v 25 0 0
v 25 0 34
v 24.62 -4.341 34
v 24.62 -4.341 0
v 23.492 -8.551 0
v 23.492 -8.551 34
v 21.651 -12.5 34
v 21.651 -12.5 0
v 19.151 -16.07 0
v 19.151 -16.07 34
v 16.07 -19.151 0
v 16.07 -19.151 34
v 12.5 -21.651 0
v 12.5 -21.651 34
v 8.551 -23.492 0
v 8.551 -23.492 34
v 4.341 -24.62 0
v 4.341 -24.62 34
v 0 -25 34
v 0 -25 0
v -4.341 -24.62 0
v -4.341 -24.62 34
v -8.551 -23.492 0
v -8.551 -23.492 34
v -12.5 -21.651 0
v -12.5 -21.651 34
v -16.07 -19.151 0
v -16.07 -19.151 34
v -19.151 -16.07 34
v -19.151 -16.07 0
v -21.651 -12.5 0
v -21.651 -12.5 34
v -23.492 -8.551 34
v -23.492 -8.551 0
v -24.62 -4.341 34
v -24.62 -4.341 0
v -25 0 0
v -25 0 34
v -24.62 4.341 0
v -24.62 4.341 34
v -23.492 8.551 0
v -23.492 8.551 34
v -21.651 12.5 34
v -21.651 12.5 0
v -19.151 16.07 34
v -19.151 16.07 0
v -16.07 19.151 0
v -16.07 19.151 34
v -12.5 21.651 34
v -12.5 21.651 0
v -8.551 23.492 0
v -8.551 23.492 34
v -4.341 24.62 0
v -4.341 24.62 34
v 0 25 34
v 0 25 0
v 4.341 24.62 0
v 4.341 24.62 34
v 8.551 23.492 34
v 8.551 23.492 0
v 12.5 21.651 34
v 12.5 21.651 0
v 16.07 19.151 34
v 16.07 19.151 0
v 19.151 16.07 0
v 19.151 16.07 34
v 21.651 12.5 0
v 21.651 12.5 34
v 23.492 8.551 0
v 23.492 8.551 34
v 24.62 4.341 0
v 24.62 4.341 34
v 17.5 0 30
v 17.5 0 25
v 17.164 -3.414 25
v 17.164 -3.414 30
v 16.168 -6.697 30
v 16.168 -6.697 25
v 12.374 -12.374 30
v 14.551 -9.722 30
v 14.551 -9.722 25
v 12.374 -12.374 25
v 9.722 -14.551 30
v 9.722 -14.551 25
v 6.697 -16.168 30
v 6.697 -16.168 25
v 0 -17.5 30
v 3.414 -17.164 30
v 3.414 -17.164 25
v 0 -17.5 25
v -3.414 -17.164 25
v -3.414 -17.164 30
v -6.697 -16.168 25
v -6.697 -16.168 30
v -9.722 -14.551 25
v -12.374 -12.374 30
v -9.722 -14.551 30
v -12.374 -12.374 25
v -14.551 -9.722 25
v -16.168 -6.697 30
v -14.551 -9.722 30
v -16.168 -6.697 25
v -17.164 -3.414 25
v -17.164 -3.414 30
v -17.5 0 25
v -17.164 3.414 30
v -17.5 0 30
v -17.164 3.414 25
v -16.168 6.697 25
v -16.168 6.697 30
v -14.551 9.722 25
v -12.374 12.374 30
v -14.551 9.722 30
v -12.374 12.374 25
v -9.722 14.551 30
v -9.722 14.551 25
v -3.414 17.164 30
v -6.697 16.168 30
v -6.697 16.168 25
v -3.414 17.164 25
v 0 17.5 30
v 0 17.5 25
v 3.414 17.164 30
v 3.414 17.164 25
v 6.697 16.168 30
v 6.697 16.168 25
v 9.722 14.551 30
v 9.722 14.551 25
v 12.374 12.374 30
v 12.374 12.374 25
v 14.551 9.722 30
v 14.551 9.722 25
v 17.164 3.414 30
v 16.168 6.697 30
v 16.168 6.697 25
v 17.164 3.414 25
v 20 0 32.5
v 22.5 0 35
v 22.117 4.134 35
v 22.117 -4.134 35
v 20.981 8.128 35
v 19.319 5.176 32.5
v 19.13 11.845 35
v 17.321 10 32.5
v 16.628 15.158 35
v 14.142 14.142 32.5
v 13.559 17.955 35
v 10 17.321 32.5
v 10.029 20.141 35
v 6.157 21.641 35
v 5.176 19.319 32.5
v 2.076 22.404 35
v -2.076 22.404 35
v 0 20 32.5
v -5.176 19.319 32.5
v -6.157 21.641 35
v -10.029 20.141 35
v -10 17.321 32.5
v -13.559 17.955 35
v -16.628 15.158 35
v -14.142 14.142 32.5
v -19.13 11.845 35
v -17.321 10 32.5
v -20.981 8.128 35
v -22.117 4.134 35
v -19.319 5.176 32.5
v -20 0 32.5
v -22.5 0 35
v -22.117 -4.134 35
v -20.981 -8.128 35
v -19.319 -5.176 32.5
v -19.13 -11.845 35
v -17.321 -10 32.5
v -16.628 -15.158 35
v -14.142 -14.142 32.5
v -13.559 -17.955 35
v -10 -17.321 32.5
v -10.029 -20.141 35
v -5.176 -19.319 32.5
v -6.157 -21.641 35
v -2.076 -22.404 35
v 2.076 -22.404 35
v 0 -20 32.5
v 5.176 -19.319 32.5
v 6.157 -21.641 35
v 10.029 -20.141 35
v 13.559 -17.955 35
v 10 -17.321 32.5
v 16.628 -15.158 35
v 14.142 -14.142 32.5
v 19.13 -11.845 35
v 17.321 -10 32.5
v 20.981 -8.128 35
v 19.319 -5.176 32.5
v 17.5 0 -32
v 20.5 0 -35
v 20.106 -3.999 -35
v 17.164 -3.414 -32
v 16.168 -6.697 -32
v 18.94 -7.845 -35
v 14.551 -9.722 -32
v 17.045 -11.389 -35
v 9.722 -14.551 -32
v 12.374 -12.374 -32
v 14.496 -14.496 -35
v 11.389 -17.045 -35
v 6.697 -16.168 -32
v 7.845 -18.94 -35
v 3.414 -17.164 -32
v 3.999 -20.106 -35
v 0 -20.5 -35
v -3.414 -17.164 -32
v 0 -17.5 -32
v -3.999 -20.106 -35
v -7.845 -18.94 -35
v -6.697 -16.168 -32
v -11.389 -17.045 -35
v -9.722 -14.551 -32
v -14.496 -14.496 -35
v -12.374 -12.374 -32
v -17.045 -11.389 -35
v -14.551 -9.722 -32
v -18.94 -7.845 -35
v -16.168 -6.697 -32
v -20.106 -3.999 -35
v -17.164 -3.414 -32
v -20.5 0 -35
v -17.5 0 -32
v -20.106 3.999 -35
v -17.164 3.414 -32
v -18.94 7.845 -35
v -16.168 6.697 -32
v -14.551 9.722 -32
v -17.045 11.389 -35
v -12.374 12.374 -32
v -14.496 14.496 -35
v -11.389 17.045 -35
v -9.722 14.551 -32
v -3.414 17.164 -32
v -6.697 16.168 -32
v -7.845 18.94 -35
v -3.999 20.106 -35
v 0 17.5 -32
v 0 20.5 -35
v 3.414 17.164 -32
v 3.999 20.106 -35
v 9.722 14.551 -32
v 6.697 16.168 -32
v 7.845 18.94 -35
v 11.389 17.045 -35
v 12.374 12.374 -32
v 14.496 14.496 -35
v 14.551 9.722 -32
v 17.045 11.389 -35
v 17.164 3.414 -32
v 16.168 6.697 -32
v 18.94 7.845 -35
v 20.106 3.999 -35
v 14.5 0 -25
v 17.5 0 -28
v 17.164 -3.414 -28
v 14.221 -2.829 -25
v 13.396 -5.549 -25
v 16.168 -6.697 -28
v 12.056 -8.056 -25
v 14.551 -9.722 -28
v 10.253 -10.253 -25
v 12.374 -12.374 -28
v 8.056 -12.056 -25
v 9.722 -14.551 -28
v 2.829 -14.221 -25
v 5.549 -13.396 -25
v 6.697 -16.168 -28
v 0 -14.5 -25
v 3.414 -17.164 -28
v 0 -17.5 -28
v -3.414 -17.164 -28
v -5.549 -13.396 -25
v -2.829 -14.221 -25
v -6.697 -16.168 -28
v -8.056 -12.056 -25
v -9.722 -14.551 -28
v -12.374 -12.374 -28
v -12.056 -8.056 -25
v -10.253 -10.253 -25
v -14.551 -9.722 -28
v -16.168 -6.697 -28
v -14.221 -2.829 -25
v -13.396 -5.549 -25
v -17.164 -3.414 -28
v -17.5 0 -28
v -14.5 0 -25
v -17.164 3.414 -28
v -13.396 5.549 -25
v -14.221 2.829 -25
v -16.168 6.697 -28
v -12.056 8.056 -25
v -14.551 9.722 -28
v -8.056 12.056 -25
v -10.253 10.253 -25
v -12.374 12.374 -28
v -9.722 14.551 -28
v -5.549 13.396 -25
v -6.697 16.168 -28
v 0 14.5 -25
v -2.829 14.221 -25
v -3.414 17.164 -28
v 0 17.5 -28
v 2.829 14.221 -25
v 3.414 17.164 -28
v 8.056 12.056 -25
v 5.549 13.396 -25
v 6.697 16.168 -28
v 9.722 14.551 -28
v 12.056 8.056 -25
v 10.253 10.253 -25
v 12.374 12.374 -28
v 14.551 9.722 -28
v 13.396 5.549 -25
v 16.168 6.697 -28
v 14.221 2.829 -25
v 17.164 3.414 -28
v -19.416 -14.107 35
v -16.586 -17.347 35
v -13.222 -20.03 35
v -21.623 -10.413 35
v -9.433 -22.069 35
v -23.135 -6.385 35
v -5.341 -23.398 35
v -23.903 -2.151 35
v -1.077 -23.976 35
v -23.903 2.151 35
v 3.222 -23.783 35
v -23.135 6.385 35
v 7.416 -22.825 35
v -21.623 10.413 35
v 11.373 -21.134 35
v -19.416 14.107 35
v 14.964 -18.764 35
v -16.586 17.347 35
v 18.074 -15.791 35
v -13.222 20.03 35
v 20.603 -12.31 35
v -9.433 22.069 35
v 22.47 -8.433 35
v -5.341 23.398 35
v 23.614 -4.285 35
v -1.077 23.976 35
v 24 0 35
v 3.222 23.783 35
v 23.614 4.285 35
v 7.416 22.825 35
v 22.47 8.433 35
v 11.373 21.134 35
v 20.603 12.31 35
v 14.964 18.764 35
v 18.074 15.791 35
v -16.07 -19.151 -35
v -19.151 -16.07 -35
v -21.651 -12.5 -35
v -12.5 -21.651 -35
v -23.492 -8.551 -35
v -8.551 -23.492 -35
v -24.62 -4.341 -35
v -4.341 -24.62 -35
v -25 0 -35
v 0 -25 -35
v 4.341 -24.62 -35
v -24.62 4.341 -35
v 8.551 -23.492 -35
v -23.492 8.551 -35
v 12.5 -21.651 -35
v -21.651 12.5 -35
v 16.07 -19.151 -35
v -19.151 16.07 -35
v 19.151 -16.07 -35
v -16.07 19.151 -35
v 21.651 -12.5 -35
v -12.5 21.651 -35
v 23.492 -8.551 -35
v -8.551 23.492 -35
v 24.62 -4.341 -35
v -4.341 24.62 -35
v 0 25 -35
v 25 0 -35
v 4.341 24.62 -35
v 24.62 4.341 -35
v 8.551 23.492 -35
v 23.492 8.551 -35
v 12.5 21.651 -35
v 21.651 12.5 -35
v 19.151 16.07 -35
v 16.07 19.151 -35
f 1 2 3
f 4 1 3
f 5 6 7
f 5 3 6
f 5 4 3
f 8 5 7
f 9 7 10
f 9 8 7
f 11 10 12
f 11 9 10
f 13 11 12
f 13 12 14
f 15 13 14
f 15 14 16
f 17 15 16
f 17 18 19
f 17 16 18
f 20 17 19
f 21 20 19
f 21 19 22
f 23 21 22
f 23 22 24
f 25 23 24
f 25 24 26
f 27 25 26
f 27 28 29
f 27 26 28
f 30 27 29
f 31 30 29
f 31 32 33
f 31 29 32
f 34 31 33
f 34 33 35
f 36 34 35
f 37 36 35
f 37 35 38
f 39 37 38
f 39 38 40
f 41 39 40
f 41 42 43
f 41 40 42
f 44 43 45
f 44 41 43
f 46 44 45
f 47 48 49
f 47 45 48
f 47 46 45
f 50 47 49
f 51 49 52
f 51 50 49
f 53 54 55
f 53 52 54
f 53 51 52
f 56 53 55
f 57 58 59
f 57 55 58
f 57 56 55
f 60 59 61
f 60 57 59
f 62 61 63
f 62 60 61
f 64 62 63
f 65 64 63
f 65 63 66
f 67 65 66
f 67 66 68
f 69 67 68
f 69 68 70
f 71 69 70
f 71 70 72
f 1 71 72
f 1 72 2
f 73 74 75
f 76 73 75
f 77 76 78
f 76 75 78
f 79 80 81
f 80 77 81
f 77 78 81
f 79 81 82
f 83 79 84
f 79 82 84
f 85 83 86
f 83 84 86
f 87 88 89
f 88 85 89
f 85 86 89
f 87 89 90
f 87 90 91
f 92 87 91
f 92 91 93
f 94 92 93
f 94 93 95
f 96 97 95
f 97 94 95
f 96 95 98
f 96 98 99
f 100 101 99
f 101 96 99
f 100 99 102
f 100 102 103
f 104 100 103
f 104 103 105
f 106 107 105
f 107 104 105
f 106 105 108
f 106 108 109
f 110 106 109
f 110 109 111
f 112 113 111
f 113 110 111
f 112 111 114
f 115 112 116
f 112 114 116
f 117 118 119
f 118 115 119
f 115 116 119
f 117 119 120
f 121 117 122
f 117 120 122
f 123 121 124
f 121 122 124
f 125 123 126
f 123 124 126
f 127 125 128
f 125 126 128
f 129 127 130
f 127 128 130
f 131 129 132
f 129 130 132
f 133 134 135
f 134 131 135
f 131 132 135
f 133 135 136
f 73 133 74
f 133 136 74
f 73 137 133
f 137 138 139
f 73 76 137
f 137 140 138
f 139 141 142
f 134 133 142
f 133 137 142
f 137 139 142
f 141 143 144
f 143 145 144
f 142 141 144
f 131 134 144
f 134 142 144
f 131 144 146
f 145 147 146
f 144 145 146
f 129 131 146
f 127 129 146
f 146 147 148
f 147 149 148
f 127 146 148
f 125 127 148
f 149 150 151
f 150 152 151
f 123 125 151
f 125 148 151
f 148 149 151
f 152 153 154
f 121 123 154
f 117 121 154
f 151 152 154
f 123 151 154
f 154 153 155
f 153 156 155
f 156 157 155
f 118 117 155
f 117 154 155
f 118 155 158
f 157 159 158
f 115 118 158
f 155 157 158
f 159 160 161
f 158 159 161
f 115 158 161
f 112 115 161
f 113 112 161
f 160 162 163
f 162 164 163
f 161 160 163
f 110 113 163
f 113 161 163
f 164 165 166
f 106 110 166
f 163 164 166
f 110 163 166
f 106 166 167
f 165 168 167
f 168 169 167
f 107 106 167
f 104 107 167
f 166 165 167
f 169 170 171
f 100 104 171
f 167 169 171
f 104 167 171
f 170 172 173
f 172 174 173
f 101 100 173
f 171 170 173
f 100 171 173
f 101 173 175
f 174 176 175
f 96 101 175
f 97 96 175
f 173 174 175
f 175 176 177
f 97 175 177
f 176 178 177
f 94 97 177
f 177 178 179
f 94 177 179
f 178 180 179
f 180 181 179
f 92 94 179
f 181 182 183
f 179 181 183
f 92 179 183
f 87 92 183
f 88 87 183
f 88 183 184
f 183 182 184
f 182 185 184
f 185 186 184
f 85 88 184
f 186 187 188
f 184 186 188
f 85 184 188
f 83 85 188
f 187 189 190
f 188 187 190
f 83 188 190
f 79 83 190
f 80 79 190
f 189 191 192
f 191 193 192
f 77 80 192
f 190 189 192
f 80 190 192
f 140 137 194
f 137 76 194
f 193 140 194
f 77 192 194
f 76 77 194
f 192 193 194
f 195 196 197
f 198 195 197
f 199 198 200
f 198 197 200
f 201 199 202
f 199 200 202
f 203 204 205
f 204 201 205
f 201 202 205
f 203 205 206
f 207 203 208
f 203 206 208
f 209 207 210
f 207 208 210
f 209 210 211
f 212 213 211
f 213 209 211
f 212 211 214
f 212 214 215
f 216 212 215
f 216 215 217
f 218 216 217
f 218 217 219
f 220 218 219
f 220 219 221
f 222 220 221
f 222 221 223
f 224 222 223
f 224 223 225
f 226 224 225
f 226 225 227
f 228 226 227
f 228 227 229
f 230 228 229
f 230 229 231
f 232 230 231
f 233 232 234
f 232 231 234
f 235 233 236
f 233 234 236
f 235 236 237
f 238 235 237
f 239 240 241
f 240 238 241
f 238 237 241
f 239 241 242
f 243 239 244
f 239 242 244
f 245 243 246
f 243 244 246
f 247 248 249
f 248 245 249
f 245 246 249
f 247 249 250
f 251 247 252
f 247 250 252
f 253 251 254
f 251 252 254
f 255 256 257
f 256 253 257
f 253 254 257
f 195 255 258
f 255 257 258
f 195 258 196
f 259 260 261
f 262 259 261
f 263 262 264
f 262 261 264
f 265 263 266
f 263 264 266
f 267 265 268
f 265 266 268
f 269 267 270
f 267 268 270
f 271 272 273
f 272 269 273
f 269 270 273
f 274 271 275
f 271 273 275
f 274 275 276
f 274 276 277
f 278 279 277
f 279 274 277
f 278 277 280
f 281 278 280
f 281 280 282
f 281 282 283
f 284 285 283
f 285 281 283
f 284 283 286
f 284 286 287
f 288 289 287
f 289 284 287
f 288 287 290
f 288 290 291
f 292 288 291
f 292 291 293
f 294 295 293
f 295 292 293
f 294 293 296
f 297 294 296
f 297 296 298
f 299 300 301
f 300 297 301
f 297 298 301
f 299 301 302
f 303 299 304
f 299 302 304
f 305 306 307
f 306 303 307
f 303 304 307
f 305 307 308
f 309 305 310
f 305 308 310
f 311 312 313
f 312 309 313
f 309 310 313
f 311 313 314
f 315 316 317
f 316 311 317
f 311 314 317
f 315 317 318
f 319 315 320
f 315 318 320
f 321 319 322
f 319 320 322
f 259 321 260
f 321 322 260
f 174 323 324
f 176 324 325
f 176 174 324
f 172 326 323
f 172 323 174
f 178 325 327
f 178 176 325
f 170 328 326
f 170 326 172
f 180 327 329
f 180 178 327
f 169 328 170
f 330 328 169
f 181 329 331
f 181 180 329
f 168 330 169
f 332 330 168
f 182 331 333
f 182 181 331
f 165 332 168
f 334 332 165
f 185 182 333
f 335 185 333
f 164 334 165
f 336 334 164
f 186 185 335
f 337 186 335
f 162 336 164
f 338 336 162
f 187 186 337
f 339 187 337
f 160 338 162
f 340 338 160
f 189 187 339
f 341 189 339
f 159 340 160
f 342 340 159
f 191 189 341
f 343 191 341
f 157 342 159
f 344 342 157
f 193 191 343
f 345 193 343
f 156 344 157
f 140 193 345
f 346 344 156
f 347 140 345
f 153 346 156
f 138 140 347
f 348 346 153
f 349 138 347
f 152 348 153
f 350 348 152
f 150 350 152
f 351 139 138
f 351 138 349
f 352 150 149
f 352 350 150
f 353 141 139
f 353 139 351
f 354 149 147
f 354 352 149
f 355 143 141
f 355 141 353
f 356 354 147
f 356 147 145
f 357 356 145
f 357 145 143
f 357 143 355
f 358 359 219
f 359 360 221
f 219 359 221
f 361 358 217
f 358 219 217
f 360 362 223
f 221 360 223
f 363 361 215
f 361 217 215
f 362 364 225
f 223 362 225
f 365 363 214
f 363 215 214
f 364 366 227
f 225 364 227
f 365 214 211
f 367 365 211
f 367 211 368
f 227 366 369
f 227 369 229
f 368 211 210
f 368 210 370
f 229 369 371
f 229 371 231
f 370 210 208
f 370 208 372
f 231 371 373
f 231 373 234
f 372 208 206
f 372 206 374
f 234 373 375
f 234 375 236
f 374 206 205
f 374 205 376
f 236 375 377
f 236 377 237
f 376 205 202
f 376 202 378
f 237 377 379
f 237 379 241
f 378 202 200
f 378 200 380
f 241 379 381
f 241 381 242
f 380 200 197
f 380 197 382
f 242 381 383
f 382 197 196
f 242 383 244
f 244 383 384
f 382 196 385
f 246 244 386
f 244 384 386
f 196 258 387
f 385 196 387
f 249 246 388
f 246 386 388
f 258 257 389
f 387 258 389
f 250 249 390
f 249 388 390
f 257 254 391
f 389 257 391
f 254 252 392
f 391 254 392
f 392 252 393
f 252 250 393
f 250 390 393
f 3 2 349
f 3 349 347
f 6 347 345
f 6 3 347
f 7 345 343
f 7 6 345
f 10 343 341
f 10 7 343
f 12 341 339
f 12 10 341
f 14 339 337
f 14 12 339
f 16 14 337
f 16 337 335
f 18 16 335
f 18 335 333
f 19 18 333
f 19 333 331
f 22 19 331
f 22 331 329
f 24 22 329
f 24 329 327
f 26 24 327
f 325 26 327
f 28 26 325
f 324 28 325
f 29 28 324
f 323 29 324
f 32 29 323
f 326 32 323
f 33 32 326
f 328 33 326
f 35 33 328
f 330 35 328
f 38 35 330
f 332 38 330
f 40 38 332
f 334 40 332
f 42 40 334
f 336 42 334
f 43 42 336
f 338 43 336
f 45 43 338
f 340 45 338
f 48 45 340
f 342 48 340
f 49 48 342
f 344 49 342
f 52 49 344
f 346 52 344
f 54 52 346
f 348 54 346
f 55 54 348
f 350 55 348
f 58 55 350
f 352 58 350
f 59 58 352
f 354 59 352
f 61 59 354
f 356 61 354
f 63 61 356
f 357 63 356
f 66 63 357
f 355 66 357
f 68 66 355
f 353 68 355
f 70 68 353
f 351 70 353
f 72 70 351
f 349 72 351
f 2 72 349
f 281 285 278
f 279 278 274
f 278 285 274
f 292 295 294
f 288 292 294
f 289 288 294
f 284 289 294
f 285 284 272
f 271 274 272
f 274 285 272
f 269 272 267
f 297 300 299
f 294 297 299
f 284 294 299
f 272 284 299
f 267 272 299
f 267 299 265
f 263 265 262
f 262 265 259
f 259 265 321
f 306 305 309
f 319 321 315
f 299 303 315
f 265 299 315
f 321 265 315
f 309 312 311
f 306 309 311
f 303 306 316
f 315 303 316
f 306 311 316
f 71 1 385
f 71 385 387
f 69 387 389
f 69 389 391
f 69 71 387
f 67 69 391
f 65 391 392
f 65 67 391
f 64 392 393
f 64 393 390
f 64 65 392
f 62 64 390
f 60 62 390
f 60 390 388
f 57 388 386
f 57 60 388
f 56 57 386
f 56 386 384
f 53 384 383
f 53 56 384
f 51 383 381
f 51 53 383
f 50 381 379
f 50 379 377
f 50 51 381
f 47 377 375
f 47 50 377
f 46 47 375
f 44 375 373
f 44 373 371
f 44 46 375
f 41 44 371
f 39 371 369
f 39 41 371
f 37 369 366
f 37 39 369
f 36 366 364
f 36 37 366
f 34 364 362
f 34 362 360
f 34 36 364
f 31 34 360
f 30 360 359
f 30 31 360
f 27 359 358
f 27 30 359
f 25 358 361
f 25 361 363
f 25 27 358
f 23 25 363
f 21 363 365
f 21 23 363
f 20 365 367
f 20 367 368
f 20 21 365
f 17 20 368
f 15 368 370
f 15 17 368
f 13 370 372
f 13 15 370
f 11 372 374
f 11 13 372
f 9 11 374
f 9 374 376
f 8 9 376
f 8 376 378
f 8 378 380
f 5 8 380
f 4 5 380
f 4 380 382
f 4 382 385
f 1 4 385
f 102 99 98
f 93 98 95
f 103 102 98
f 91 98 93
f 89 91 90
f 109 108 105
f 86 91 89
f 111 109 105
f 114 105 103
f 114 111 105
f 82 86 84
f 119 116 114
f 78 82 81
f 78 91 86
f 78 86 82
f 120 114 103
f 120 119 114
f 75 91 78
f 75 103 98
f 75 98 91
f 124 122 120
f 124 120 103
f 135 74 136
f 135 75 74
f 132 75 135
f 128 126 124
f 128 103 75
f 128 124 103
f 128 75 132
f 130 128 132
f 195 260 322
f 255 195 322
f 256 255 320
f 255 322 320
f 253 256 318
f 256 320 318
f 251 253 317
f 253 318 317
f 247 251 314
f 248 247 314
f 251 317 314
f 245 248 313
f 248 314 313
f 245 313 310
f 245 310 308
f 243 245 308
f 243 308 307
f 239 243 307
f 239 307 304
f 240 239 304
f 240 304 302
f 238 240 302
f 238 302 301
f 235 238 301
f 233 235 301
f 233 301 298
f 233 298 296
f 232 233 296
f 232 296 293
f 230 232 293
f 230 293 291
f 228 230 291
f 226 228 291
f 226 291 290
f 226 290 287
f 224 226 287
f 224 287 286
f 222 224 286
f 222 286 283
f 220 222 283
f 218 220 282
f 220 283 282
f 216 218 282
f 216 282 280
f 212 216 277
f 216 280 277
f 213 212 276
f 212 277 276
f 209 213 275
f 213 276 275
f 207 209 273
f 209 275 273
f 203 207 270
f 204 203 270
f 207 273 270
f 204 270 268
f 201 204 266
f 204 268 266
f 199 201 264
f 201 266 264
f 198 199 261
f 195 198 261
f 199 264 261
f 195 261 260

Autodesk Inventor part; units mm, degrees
ref_plane "YZ Plane" through (0, 0, 0) normal (1, 0, 0) x (0, 1, 0)
ref_plane "XZ Plane" through (0, 0, 0) normal (0, 1, 0) x (-1, 0, 0)
ref_plane "XY Plane" through (0, 0, 0) normal (0, 0, 1) x (1, 0, 0)
sketch "Sketch1" plane through (0, 0, 0) normal (0, 0, 1) x (1, 0, 0)
  circle A0 centre (0, 0) radius 25
  circle A1 centre (0, 0) radius 17.5
  dimension "d0" = 35
  dimension "d1" = 50
extrude "Extrusion1" add sketch "Sketch1" along normal mid plane 50 contours A1
extrude "Extrusion2" add sketch "Sketch1" along normal mid plane 70
chamfer "Chamfer1" distance 5 angle 45 1 edges at (-17.5, 0, 35)
chamfer "Chamfer2" distance 1 angle 45 1 edges at (-25, 0, 35)
chamfer "Chamfer3" distance 3 angle 45 2 edges at (-17.5, 0, -25) (-17.5, 0, -35)
properties part number "LENS"
